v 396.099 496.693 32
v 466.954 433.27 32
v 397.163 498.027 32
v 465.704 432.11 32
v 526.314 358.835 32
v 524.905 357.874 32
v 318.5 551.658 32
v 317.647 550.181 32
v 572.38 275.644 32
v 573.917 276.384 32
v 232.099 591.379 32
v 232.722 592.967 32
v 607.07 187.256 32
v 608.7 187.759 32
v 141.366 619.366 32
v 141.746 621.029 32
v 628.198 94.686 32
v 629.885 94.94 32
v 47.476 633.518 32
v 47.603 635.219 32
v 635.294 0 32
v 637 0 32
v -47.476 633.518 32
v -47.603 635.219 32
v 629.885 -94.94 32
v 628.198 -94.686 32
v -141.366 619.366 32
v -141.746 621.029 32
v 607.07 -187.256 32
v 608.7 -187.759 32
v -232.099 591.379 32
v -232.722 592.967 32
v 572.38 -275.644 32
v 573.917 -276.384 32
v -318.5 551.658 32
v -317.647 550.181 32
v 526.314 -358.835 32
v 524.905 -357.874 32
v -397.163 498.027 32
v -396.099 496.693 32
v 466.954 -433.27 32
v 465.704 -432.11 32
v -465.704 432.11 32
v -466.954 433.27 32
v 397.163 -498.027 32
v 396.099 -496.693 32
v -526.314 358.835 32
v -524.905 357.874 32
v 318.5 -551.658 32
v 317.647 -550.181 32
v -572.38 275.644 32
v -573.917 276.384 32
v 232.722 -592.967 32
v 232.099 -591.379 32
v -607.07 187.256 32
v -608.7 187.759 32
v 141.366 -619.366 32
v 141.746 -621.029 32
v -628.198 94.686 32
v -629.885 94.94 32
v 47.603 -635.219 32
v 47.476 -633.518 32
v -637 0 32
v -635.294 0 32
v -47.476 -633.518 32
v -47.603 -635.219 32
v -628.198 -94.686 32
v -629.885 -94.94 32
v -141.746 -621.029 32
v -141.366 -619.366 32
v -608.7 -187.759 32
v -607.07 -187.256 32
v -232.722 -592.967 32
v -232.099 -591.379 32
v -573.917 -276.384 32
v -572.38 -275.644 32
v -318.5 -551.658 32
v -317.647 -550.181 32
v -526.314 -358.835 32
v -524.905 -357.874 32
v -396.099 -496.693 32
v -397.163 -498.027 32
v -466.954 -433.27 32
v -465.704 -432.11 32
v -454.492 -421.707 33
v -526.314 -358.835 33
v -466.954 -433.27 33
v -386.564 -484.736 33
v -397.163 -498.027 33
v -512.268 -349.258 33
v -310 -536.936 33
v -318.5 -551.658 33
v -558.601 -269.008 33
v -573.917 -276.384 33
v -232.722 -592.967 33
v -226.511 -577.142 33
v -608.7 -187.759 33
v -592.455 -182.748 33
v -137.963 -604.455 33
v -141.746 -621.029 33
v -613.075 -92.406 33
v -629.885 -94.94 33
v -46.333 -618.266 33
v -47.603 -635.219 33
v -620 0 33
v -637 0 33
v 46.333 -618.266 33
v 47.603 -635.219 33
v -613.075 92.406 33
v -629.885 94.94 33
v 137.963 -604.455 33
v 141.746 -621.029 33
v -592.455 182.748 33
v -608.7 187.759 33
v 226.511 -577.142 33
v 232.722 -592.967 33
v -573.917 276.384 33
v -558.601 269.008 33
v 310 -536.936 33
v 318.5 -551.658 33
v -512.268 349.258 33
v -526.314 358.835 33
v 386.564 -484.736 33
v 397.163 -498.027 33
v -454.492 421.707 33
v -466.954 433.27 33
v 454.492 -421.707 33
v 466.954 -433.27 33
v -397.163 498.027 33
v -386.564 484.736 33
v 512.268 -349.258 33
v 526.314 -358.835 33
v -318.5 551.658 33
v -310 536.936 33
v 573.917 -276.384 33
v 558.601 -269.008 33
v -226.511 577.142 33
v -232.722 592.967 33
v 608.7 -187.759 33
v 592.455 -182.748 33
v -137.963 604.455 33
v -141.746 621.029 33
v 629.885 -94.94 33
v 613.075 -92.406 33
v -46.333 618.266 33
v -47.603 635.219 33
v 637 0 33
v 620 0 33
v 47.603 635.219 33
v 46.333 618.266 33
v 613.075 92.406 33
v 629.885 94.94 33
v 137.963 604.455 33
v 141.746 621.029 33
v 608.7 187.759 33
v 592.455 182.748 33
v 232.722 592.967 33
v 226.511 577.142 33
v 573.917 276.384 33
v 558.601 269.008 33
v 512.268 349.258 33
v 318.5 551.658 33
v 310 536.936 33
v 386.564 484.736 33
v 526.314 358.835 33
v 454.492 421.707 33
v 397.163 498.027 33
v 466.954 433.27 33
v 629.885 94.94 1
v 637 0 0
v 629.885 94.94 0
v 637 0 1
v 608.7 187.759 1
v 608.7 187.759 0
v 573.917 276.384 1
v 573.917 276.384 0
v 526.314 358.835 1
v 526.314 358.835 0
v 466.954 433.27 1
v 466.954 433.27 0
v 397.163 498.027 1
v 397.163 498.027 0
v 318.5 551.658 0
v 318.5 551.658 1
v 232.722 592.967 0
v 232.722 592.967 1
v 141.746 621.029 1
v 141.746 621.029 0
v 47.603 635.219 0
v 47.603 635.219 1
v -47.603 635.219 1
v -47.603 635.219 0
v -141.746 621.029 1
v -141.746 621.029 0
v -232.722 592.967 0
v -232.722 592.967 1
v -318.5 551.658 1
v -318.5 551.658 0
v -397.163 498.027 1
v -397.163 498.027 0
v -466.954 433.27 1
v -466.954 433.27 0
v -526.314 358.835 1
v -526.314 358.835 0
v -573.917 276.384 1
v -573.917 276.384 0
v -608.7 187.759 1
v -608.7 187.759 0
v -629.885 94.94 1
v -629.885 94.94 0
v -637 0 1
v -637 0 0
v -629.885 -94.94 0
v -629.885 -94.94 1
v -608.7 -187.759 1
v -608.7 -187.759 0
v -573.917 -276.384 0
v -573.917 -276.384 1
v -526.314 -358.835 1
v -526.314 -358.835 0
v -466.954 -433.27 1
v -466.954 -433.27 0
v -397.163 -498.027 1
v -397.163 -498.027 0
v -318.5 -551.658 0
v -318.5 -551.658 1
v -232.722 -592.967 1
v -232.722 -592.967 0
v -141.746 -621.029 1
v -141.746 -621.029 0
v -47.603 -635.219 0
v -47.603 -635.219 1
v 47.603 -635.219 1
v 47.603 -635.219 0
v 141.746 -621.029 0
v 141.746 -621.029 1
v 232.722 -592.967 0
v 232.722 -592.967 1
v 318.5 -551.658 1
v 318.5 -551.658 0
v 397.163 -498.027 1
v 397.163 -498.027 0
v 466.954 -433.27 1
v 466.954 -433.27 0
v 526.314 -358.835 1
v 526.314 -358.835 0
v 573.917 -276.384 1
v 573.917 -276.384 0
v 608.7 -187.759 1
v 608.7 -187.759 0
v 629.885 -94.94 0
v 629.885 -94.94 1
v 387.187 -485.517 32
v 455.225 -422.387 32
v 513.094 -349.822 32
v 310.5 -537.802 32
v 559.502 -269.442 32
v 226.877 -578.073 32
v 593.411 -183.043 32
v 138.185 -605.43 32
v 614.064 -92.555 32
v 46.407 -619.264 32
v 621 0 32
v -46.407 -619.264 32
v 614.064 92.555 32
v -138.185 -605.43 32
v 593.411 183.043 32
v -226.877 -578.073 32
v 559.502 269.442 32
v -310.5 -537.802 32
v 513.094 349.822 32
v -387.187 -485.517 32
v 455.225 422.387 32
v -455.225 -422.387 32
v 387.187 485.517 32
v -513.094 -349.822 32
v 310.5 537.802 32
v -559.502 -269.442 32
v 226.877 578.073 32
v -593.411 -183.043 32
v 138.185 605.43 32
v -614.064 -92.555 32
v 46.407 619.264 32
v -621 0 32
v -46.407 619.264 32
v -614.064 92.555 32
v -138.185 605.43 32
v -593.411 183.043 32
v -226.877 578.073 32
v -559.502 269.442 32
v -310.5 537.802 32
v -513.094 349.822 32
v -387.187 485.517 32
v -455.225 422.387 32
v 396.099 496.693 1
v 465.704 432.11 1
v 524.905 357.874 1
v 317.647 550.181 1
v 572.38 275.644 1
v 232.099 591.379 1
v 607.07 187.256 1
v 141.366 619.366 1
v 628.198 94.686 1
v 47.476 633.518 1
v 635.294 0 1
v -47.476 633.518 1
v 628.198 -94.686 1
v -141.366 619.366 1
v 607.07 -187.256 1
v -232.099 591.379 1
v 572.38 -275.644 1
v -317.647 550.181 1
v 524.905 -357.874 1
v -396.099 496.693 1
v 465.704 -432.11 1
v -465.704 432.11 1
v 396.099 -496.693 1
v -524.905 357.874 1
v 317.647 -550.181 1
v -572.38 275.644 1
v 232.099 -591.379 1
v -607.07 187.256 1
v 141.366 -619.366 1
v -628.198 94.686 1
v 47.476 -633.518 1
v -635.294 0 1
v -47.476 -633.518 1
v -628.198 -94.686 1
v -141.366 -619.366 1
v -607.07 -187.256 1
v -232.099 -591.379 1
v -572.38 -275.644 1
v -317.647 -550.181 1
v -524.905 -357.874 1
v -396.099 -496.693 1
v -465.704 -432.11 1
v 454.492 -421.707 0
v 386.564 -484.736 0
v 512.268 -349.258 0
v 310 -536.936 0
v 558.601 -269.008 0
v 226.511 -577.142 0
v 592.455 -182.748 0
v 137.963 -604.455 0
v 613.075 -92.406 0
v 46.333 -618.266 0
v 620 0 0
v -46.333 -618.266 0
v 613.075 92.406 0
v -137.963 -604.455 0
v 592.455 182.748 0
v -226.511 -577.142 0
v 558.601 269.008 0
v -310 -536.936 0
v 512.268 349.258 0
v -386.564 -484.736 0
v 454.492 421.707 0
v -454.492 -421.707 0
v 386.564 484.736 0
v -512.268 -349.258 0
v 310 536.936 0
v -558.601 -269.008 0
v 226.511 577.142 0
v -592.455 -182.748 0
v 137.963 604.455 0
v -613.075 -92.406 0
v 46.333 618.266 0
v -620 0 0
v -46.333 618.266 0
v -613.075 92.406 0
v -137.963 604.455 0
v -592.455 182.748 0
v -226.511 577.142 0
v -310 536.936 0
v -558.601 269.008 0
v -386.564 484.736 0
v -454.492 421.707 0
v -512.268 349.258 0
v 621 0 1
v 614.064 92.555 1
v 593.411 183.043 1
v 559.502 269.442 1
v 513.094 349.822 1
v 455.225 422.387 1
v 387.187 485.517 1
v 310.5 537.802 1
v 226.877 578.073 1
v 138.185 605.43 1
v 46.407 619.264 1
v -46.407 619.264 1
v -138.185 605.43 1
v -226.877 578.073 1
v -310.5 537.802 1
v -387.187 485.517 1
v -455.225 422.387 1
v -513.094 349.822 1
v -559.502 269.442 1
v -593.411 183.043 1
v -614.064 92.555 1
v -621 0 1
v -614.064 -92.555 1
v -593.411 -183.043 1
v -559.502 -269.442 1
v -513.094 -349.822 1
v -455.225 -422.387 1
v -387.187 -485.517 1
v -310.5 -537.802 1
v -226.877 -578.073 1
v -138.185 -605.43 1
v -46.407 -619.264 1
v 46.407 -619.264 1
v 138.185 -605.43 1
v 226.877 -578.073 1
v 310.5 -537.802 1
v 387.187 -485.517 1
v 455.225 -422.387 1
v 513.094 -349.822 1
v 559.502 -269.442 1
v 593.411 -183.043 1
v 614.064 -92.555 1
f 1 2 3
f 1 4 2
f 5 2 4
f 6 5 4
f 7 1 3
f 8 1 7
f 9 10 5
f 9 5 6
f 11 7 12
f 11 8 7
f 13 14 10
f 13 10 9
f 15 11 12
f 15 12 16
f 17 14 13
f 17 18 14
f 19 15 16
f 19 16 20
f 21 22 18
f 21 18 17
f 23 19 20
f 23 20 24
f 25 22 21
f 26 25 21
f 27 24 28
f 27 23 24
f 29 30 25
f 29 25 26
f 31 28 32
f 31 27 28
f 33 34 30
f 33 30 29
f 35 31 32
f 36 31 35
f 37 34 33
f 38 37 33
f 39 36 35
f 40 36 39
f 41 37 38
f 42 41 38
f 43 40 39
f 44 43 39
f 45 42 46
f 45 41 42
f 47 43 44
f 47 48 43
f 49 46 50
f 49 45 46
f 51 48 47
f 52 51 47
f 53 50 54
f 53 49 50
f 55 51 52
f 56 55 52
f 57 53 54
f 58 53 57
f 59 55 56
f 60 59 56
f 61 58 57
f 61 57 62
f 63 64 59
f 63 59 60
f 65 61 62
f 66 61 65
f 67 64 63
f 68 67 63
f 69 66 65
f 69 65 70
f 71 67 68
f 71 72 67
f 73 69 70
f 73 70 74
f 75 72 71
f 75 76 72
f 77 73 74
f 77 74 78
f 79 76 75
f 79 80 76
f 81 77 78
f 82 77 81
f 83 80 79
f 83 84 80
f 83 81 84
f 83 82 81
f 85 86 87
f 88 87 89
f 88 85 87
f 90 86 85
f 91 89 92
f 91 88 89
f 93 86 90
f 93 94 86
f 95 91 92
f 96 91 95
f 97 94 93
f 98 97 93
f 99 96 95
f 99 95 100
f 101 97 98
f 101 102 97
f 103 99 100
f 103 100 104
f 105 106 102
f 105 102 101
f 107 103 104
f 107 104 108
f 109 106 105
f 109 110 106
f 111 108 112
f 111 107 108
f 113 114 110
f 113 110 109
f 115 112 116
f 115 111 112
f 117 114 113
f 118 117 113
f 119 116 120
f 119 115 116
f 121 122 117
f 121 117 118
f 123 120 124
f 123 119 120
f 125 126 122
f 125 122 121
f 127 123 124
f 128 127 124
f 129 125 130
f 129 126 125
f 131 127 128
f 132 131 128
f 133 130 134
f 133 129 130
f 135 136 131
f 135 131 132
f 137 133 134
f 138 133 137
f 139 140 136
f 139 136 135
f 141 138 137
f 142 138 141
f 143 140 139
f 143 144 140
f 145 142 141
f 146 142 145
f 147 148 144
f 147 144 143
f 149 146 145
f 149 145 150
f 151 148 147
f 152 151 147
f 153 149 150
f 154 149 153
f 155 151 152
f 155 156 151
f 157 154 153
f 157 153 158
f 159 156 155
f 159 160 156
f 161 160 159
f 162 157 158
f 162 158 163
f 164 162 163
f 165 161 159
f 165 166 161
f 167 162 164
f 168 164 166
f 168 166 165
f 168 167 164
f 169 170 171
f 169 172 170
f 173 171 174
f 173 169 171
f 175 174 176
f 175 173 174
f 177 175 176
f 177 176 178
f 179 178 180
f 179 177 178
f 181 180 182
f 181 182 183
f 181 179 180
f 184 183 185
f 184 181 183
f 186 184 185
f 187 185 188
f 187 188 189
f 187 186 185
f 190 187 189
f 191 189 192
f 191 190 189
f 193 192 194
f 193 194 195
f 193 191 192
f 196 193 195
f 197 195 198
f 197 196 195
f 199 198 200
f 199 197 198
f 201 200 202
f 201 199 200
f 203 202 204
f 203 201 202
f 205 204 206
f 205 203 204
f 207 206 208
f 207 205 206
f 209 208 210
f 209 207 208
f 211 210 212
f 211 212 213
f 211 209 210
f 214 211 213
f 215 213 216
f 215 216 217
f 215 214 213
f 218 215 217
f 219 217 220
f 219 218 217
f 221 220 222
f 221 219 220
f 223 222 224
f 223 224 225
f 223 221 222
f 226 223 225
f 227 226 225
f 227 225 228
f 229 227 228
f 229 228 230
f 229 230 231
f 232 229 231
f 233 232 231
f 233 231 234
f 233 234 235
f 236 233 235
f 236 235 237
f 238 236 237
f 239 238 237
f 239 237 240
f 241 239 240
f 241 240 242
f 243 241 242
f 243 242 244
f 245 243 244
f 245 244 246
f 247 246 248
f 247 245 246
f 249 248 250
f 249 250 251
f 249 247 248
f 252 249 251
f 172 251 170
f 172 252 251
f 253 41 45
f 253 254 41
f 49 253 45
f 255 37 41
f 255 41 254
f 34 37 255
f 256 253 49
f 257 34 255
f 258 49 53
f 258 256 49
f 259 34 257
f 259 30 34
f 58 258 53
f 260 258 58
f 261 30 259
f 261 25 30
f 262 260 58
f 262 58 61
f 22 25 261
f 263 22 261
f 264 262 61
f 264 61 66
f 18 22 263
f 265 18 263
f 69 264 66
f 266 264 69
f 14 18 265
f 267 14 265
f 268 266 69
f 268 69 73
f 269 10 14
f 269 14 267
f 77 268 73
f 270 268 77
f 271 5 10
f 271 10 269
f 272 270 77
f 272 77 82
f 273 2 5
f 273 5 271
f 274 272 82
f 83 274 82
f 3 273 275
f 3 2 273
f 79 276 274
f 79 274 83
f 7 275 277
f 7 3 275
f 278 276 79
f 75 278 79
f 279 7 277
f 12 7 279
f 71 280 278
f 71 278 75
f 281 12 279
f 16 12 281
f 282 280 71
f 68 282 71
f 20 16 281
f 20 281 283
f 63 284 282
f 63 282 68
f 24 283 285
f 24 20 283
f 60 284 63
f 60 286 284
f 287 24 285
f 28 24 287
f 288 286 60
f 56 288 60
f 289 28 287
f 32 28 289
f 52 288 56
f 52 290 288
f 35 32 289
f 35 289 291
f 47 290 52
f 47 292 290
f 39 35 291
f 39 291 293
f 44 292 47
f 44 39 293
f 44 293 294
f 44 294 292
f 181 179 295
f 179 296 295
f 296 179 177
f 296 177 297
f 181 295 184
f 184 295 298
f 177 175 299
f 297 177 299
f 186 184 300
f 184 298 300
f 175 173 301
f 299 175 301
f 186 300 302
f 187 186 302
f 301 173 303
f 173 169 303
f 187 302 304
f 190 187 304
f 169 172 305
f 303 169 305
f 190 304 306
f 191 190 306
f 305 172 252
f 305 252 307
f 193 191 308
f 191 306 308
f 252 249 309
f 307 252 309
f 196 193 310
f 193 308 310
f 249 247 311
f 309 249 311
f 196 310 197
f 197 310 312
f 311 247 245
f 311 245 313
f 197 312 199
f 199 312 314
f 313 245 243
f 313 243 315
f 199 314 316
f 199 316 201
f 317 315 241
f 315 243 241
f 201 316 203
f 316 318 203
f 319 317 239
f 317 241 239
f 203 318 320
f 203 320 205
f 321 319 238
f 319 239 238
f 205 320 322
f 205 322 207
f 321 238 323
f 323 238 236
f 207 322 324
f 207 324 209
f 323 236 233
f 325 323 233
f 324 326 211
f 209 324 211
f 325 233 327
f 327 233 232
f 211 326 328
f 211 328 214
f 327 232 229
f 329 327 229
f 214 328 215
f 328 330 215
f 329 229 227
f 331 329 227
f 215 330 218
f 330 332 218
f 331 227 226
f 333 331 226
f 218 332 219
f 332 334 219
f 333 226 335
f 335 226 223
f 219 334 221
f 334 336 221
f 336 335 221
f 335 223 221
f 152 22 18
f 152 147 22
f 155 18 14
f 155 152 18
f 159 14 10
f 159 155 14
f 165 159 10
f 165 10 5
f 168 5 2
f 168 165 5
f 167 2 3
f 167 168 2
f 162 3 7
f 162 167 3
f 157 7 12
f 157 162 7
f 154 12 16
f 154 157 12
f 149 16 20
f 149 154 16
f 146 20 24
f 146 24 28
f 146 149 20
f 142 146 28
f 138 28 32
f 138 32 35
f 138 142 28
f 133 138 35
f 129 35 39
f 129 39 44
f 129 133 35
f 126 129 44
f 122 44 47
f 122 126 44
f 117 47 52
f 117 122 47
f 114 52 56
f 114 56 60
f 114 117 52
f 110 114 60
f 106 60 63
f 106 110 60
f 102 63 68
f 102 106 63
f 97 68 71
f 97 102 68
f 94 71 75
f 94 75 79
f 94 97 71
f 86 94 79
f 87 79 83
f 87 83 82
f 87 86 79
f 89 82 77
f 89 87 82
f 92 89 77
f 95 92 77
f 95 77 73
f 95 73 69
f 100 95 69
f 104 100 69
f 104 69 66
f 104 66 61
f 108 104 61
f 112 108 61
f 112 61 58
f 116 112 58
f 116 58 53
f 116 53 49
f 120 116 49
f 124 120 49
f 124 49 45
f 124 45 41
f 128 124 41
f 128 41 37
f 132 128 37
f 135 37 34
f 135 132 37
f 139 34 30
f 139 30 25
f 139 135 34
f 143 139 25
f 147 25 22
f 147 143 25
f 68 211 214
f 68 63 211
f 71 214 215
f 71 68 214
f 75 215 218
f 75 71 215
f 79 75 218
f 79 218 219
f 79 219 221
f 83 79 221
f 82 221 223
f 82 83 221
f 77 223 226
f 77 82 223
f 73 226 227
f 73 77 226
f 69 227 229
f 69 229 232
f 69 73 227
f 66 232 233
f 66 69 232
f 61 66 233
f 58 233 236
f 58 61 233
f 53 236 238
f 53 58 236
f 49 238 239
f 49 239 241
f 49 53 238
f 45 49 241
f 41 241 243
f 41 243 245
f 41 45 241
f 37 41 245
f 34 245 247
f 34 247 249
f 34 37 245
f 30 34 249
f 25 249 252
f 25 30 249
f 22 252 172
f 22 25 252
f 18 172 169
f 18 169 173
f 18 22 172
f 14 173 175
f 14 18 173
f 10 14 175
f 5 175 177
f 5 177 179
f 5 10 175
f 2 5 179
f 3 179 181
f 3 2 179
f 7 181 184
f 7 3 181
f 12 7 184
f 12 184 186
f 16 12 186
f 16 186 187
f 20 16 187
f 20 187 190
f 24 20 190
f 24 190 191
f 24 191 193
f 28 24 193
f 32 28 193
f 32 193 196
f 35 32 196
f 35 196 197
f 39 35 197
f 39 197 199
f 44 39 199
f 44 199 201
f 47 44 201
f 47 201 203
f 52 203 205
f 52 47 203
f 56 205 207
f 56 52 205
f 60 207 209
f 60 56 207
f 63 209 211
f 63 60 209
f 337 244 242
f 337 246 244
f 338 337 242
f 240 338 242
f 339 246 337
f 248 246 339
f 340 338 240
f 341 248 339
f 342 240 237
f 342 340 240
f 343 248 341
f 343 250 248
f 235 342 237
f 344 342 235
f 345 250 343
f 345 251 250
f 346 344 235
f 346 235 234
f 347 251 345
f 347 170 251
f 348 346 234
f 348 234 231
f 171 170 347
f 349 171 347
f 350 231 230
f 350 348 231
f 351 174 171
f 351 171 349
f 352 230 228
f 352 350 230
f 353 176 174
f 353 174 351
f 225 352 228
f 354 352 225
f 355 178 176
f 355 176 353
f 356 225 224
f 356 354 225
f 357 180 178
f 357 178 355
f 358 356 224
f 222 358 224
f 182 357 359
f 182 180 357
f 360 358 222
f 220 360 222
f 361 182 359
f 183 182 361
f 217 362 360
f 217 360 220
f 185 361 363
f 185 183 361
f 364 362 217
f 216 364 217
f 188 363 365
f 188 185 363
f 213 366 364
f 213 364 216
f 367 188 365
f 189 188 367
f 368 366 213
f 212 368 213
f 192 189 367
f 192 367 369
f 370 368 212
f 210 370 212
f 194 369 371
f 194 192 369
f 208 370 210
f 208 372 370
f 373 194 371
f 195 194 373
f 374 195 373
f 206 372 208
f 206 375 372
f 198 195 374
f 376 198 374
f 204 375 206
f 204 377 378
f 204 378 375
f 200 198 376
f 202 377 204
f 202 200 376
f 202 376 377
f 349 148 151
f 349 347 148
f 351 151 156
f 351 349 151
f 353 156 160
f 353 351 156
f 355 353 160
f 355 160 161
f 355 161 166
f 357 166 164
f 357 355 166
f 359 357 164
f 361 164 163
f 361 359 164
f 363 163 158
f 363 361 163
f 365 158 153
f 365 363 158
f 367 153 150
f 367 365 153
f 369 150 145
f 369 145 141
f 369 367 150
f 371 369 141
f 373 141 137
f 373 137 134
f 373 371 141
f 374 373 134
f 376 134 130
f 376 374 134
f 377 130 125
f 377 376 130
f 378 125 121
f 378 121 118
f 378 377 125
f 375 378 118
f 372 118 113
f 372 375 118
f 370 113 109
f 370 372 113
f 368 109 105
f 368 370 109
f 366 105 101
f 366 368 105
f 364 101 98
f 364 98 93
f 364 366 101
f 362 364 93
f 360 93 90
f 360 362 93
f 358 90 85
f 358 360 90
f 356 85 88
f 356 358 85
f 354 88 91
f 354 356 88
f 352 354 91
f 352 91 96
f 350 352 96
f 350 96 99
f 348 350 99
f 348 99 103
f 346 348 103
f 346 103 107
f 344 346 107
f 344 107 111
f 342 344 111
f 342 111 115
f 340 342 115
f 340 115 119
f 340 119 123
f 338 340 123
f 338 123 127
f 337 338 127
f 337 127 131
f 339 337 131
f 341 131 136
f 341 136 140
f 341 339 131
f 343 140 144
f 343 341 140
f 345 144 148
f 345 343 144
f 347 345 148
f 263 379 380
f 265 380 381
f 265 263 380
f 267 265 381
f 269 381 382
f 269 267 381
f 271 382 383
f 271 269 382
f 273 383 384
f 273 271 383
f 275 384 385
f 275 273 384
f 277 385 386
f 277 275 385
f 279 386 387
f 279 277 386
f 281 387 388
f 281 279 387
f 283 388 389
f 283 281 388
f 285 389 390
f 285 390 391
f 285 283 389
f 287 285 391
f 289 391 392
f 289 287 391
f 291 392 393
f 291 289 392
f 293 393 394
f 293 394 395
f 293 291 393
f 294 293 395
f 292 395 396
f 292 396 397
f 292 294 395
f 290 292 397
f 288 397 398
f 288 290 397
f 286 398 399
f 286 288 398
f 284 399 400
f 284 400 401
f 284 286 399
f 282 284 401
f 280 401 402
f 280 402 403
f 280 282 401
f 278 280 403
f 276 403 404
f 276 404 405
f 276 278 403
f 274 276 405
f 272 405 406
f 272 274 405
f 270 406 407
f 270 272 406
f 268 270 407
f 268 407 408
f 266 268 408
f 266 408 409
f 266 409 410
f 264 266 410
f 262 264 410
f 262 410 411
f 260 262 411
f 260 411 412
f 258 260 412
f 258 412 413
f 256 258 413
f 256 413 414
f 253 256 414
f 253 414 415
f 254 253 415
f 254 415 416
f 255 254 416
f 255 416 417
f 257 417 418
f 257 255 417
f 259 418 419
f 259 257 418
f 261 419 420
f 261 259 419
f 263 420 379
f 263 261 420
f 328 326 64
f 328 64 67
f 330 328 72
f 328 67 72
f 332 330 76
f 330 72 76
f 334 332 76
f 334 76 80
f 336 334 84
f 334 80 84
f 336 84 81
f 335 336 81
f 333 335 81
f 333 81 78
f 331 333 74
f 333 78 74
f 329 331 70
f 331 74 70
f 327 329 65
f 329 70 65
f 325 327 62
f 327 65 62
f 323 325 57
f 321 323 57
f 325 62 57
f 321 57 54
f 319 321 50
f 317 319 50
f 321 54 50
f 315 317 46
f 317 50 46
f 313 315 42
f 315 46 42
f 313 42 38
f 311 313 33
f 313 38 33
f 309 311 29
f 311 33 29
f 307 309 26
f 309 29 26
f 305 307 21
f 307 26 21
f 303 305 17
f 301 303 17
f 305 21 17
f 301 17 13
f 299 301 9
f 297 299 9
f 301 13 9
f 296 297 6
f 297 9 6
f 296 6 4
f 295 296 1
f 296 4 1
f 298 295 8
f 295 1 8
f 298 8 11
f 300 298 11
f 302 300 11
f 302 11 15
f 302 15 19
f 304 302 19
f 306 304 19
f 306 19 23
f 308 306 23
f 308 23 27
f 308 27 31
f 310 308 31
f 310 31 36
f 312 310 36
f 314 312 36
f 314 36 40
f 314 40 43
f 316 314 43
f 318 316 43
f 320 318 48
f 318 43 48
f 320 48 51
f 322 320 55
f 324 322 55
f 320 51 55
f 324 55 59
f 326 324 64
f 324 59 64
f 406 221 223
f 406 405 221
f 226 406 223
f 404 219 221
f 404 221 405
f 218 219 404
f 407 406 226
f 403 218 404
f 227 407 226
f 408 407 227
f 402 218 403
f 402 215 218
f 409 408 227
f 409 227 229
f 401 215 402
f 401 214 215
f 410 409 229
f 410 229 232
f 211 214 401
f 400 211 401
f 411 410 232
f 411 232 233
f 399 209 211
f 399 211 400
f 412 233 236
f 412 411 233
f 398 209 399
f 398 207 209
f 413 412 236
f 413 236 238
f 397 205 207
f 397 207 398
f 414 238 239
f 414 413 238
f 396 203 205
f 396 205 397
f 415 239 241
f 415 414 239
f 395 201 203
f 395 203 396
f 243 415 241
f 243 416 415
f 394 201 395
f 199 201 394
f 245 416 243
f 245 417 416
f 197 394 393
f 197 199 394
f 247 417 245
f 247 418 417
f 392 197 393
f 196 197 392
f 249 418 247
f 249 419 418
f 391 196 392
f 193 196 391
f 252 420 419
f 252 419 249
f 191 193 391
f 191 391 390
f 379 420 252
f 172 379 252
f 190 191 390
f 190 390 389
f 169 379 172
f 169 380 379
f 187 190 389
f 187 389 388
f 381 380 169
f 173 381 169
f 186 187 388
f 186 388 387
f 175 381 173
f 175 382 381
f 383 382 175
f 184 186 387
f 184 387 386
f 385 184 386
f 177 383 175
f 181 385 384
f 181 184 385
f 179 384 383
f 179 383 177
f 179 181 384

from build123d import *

# Parameters (mm, degrees)
F2_W = 1.705801
F2_H = 31


with BuildPart() as f1:
    # F0 (on Front) → F1 (revolve)
    with BuildSketch(Plane.XZ):
        Polygon((620, 33), (620, 0), (637, 0), (637, 1), (621, 1), (621, 32), (637, 32), (637, 33), align=None)
    revolve(axis=Axis((0, 0, 7.4422), (0, 0, 1)))


with BuildPart() as f3:
    # F2 (on Front) → F3 (revolve)
    with BuildSketch(Plane.XZ):
        with Locations((-636.147099, 16.5)):
            Rectangle(F2_W, F2_H)
    revolve(axis=Axis((0, 0, 16), (0, 0, 1)))


solid = Compound([f1.part, f3.part])
